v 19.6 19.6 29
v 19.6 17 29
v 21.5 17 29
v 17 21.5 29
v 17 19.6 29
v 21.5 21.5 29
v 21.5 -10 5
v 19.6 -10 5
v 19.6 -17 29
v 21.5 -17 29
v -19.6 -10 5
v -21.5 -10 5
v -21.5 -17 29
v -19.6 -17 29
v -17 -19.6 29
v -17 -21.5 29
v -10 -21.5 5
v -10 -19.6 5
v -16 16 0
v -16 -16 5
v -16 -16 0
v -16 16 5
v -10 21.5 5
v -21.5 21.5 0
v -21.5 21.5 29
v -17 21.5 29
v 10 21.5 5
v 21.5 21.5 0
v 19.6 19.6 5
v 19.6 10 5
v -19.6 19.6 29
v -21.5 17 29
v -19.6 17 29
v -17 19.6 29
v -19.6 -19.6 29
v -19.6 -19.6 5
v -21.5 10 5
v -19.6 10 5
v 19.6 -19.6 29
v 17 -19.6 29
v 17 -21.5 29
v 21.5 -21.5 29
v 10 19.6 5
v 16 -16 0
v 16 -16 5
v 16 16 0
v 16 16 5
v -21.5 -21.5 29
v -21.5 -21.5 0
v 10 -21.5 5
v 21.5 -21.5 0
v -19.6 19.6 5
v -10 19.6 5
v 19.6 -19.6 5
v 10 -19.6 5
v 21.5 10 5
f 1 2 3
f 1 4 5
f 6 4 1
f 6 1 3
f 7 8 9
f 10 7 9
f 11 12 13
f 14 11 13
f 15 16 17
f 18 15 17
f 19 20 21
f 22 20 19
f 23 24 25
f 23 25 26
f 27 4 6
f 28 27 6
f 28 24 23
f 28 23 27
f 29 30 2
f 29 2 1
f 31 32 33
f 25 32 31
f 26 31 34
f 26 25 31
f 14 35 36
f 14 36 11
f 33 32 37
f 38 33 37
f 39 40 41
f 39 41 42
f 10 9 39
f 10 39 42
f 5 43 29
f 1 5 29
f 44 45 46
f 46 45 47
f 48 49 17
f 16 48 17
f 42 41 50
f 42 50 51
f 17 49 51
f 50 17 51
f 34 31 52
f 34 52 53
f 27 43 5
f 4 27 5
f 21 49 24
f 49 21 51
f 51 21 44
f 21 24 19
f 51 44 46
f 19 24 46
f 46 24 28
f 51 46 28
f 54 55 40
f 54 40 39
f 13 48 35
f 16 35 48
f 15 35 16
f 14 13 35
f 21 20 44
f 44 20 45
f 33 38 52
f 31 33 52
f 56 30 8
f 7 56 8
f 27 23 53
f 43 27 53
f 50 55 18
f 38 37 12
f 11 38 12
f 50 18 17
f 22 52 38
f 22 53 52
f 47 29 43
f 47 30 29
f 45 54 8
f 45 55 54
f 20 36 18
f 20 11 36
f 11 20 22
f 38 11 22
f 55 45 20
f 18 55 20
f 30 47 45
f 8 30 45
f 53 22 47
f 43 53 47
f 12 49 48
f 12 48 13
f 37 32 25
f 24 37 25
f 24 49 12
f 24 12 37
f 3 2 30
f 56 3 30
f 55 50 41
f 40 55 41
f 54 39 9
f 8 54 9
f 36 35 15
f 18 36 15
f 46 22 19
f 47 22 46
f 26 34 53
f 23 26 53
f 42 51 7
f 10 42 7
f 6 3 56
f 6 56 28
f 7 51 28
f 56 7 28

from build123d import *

# Parameters (mm, degrees)
SKETCH_W        = 43
SKETCH_H        = 43
PAD_DEPTH       = 29
SKETCH001_W     = 39.2
SKETCH001_H     = 39.2
POCKET_DEPTH    = 24
SKETCH002_W     = 32
SKETCH002_H     = 32
POCKET001_DEPTH = 5.001
POCKET002_DEPTH = 43.001
POCKET003_DEPTH = 43.001


with BuildPart() as part:
    # Sketch → Pad (new body)
    with BuildSketch(Plane.XY):
        Rectangle(SKETCH_W, SKETCH_H)
    extrude(amount=PAD_DEPTH)

    # Sketch001 → Pocket (cut)
    with BuildSketch(Plane.XY.offset(29)):
        Rectangle(SKETCH001_W, SKETCH001_H)
    extrude(amount=-POCKET_DEPTH, mode=Mode.SUBTRACT)

    # Sketch002 → Pocket001 (cut, through all)
    with BuildSketch(Plane.XY.offset(5)):
        Rectangle(SKETCH002_W, SKETCH002_H)
    extrude(amount=-POCKET001_DEPTH, mode=Mode.SUBTRACT)

    # Sketch003 → Pocket002 (cut, through all)
    with BuildSketch(Plane.XZ.offset(21.5)):
        Polygon((-17, 29), (-10, 5), (10, 5), (17, 29), align=None)
    extrude(amount=-POCKET002_DEPTH, mode=Mode.SUBTRACT)

    # Sketch004 → Pocket003 (cut, through all)
    with BuildSketch(Plane(origin=(-21.5, 0, 0), x_dir=(0, -1, 0), z_dir=(-1, 0, 0))):
        Polygon((-17, 29), (-10, 5), (10, 5), (17, 29), align=None)
    extrude(amount=-POCKET003_DEPTH, mode=Mode.SUBTRACT)


solid = part.part
